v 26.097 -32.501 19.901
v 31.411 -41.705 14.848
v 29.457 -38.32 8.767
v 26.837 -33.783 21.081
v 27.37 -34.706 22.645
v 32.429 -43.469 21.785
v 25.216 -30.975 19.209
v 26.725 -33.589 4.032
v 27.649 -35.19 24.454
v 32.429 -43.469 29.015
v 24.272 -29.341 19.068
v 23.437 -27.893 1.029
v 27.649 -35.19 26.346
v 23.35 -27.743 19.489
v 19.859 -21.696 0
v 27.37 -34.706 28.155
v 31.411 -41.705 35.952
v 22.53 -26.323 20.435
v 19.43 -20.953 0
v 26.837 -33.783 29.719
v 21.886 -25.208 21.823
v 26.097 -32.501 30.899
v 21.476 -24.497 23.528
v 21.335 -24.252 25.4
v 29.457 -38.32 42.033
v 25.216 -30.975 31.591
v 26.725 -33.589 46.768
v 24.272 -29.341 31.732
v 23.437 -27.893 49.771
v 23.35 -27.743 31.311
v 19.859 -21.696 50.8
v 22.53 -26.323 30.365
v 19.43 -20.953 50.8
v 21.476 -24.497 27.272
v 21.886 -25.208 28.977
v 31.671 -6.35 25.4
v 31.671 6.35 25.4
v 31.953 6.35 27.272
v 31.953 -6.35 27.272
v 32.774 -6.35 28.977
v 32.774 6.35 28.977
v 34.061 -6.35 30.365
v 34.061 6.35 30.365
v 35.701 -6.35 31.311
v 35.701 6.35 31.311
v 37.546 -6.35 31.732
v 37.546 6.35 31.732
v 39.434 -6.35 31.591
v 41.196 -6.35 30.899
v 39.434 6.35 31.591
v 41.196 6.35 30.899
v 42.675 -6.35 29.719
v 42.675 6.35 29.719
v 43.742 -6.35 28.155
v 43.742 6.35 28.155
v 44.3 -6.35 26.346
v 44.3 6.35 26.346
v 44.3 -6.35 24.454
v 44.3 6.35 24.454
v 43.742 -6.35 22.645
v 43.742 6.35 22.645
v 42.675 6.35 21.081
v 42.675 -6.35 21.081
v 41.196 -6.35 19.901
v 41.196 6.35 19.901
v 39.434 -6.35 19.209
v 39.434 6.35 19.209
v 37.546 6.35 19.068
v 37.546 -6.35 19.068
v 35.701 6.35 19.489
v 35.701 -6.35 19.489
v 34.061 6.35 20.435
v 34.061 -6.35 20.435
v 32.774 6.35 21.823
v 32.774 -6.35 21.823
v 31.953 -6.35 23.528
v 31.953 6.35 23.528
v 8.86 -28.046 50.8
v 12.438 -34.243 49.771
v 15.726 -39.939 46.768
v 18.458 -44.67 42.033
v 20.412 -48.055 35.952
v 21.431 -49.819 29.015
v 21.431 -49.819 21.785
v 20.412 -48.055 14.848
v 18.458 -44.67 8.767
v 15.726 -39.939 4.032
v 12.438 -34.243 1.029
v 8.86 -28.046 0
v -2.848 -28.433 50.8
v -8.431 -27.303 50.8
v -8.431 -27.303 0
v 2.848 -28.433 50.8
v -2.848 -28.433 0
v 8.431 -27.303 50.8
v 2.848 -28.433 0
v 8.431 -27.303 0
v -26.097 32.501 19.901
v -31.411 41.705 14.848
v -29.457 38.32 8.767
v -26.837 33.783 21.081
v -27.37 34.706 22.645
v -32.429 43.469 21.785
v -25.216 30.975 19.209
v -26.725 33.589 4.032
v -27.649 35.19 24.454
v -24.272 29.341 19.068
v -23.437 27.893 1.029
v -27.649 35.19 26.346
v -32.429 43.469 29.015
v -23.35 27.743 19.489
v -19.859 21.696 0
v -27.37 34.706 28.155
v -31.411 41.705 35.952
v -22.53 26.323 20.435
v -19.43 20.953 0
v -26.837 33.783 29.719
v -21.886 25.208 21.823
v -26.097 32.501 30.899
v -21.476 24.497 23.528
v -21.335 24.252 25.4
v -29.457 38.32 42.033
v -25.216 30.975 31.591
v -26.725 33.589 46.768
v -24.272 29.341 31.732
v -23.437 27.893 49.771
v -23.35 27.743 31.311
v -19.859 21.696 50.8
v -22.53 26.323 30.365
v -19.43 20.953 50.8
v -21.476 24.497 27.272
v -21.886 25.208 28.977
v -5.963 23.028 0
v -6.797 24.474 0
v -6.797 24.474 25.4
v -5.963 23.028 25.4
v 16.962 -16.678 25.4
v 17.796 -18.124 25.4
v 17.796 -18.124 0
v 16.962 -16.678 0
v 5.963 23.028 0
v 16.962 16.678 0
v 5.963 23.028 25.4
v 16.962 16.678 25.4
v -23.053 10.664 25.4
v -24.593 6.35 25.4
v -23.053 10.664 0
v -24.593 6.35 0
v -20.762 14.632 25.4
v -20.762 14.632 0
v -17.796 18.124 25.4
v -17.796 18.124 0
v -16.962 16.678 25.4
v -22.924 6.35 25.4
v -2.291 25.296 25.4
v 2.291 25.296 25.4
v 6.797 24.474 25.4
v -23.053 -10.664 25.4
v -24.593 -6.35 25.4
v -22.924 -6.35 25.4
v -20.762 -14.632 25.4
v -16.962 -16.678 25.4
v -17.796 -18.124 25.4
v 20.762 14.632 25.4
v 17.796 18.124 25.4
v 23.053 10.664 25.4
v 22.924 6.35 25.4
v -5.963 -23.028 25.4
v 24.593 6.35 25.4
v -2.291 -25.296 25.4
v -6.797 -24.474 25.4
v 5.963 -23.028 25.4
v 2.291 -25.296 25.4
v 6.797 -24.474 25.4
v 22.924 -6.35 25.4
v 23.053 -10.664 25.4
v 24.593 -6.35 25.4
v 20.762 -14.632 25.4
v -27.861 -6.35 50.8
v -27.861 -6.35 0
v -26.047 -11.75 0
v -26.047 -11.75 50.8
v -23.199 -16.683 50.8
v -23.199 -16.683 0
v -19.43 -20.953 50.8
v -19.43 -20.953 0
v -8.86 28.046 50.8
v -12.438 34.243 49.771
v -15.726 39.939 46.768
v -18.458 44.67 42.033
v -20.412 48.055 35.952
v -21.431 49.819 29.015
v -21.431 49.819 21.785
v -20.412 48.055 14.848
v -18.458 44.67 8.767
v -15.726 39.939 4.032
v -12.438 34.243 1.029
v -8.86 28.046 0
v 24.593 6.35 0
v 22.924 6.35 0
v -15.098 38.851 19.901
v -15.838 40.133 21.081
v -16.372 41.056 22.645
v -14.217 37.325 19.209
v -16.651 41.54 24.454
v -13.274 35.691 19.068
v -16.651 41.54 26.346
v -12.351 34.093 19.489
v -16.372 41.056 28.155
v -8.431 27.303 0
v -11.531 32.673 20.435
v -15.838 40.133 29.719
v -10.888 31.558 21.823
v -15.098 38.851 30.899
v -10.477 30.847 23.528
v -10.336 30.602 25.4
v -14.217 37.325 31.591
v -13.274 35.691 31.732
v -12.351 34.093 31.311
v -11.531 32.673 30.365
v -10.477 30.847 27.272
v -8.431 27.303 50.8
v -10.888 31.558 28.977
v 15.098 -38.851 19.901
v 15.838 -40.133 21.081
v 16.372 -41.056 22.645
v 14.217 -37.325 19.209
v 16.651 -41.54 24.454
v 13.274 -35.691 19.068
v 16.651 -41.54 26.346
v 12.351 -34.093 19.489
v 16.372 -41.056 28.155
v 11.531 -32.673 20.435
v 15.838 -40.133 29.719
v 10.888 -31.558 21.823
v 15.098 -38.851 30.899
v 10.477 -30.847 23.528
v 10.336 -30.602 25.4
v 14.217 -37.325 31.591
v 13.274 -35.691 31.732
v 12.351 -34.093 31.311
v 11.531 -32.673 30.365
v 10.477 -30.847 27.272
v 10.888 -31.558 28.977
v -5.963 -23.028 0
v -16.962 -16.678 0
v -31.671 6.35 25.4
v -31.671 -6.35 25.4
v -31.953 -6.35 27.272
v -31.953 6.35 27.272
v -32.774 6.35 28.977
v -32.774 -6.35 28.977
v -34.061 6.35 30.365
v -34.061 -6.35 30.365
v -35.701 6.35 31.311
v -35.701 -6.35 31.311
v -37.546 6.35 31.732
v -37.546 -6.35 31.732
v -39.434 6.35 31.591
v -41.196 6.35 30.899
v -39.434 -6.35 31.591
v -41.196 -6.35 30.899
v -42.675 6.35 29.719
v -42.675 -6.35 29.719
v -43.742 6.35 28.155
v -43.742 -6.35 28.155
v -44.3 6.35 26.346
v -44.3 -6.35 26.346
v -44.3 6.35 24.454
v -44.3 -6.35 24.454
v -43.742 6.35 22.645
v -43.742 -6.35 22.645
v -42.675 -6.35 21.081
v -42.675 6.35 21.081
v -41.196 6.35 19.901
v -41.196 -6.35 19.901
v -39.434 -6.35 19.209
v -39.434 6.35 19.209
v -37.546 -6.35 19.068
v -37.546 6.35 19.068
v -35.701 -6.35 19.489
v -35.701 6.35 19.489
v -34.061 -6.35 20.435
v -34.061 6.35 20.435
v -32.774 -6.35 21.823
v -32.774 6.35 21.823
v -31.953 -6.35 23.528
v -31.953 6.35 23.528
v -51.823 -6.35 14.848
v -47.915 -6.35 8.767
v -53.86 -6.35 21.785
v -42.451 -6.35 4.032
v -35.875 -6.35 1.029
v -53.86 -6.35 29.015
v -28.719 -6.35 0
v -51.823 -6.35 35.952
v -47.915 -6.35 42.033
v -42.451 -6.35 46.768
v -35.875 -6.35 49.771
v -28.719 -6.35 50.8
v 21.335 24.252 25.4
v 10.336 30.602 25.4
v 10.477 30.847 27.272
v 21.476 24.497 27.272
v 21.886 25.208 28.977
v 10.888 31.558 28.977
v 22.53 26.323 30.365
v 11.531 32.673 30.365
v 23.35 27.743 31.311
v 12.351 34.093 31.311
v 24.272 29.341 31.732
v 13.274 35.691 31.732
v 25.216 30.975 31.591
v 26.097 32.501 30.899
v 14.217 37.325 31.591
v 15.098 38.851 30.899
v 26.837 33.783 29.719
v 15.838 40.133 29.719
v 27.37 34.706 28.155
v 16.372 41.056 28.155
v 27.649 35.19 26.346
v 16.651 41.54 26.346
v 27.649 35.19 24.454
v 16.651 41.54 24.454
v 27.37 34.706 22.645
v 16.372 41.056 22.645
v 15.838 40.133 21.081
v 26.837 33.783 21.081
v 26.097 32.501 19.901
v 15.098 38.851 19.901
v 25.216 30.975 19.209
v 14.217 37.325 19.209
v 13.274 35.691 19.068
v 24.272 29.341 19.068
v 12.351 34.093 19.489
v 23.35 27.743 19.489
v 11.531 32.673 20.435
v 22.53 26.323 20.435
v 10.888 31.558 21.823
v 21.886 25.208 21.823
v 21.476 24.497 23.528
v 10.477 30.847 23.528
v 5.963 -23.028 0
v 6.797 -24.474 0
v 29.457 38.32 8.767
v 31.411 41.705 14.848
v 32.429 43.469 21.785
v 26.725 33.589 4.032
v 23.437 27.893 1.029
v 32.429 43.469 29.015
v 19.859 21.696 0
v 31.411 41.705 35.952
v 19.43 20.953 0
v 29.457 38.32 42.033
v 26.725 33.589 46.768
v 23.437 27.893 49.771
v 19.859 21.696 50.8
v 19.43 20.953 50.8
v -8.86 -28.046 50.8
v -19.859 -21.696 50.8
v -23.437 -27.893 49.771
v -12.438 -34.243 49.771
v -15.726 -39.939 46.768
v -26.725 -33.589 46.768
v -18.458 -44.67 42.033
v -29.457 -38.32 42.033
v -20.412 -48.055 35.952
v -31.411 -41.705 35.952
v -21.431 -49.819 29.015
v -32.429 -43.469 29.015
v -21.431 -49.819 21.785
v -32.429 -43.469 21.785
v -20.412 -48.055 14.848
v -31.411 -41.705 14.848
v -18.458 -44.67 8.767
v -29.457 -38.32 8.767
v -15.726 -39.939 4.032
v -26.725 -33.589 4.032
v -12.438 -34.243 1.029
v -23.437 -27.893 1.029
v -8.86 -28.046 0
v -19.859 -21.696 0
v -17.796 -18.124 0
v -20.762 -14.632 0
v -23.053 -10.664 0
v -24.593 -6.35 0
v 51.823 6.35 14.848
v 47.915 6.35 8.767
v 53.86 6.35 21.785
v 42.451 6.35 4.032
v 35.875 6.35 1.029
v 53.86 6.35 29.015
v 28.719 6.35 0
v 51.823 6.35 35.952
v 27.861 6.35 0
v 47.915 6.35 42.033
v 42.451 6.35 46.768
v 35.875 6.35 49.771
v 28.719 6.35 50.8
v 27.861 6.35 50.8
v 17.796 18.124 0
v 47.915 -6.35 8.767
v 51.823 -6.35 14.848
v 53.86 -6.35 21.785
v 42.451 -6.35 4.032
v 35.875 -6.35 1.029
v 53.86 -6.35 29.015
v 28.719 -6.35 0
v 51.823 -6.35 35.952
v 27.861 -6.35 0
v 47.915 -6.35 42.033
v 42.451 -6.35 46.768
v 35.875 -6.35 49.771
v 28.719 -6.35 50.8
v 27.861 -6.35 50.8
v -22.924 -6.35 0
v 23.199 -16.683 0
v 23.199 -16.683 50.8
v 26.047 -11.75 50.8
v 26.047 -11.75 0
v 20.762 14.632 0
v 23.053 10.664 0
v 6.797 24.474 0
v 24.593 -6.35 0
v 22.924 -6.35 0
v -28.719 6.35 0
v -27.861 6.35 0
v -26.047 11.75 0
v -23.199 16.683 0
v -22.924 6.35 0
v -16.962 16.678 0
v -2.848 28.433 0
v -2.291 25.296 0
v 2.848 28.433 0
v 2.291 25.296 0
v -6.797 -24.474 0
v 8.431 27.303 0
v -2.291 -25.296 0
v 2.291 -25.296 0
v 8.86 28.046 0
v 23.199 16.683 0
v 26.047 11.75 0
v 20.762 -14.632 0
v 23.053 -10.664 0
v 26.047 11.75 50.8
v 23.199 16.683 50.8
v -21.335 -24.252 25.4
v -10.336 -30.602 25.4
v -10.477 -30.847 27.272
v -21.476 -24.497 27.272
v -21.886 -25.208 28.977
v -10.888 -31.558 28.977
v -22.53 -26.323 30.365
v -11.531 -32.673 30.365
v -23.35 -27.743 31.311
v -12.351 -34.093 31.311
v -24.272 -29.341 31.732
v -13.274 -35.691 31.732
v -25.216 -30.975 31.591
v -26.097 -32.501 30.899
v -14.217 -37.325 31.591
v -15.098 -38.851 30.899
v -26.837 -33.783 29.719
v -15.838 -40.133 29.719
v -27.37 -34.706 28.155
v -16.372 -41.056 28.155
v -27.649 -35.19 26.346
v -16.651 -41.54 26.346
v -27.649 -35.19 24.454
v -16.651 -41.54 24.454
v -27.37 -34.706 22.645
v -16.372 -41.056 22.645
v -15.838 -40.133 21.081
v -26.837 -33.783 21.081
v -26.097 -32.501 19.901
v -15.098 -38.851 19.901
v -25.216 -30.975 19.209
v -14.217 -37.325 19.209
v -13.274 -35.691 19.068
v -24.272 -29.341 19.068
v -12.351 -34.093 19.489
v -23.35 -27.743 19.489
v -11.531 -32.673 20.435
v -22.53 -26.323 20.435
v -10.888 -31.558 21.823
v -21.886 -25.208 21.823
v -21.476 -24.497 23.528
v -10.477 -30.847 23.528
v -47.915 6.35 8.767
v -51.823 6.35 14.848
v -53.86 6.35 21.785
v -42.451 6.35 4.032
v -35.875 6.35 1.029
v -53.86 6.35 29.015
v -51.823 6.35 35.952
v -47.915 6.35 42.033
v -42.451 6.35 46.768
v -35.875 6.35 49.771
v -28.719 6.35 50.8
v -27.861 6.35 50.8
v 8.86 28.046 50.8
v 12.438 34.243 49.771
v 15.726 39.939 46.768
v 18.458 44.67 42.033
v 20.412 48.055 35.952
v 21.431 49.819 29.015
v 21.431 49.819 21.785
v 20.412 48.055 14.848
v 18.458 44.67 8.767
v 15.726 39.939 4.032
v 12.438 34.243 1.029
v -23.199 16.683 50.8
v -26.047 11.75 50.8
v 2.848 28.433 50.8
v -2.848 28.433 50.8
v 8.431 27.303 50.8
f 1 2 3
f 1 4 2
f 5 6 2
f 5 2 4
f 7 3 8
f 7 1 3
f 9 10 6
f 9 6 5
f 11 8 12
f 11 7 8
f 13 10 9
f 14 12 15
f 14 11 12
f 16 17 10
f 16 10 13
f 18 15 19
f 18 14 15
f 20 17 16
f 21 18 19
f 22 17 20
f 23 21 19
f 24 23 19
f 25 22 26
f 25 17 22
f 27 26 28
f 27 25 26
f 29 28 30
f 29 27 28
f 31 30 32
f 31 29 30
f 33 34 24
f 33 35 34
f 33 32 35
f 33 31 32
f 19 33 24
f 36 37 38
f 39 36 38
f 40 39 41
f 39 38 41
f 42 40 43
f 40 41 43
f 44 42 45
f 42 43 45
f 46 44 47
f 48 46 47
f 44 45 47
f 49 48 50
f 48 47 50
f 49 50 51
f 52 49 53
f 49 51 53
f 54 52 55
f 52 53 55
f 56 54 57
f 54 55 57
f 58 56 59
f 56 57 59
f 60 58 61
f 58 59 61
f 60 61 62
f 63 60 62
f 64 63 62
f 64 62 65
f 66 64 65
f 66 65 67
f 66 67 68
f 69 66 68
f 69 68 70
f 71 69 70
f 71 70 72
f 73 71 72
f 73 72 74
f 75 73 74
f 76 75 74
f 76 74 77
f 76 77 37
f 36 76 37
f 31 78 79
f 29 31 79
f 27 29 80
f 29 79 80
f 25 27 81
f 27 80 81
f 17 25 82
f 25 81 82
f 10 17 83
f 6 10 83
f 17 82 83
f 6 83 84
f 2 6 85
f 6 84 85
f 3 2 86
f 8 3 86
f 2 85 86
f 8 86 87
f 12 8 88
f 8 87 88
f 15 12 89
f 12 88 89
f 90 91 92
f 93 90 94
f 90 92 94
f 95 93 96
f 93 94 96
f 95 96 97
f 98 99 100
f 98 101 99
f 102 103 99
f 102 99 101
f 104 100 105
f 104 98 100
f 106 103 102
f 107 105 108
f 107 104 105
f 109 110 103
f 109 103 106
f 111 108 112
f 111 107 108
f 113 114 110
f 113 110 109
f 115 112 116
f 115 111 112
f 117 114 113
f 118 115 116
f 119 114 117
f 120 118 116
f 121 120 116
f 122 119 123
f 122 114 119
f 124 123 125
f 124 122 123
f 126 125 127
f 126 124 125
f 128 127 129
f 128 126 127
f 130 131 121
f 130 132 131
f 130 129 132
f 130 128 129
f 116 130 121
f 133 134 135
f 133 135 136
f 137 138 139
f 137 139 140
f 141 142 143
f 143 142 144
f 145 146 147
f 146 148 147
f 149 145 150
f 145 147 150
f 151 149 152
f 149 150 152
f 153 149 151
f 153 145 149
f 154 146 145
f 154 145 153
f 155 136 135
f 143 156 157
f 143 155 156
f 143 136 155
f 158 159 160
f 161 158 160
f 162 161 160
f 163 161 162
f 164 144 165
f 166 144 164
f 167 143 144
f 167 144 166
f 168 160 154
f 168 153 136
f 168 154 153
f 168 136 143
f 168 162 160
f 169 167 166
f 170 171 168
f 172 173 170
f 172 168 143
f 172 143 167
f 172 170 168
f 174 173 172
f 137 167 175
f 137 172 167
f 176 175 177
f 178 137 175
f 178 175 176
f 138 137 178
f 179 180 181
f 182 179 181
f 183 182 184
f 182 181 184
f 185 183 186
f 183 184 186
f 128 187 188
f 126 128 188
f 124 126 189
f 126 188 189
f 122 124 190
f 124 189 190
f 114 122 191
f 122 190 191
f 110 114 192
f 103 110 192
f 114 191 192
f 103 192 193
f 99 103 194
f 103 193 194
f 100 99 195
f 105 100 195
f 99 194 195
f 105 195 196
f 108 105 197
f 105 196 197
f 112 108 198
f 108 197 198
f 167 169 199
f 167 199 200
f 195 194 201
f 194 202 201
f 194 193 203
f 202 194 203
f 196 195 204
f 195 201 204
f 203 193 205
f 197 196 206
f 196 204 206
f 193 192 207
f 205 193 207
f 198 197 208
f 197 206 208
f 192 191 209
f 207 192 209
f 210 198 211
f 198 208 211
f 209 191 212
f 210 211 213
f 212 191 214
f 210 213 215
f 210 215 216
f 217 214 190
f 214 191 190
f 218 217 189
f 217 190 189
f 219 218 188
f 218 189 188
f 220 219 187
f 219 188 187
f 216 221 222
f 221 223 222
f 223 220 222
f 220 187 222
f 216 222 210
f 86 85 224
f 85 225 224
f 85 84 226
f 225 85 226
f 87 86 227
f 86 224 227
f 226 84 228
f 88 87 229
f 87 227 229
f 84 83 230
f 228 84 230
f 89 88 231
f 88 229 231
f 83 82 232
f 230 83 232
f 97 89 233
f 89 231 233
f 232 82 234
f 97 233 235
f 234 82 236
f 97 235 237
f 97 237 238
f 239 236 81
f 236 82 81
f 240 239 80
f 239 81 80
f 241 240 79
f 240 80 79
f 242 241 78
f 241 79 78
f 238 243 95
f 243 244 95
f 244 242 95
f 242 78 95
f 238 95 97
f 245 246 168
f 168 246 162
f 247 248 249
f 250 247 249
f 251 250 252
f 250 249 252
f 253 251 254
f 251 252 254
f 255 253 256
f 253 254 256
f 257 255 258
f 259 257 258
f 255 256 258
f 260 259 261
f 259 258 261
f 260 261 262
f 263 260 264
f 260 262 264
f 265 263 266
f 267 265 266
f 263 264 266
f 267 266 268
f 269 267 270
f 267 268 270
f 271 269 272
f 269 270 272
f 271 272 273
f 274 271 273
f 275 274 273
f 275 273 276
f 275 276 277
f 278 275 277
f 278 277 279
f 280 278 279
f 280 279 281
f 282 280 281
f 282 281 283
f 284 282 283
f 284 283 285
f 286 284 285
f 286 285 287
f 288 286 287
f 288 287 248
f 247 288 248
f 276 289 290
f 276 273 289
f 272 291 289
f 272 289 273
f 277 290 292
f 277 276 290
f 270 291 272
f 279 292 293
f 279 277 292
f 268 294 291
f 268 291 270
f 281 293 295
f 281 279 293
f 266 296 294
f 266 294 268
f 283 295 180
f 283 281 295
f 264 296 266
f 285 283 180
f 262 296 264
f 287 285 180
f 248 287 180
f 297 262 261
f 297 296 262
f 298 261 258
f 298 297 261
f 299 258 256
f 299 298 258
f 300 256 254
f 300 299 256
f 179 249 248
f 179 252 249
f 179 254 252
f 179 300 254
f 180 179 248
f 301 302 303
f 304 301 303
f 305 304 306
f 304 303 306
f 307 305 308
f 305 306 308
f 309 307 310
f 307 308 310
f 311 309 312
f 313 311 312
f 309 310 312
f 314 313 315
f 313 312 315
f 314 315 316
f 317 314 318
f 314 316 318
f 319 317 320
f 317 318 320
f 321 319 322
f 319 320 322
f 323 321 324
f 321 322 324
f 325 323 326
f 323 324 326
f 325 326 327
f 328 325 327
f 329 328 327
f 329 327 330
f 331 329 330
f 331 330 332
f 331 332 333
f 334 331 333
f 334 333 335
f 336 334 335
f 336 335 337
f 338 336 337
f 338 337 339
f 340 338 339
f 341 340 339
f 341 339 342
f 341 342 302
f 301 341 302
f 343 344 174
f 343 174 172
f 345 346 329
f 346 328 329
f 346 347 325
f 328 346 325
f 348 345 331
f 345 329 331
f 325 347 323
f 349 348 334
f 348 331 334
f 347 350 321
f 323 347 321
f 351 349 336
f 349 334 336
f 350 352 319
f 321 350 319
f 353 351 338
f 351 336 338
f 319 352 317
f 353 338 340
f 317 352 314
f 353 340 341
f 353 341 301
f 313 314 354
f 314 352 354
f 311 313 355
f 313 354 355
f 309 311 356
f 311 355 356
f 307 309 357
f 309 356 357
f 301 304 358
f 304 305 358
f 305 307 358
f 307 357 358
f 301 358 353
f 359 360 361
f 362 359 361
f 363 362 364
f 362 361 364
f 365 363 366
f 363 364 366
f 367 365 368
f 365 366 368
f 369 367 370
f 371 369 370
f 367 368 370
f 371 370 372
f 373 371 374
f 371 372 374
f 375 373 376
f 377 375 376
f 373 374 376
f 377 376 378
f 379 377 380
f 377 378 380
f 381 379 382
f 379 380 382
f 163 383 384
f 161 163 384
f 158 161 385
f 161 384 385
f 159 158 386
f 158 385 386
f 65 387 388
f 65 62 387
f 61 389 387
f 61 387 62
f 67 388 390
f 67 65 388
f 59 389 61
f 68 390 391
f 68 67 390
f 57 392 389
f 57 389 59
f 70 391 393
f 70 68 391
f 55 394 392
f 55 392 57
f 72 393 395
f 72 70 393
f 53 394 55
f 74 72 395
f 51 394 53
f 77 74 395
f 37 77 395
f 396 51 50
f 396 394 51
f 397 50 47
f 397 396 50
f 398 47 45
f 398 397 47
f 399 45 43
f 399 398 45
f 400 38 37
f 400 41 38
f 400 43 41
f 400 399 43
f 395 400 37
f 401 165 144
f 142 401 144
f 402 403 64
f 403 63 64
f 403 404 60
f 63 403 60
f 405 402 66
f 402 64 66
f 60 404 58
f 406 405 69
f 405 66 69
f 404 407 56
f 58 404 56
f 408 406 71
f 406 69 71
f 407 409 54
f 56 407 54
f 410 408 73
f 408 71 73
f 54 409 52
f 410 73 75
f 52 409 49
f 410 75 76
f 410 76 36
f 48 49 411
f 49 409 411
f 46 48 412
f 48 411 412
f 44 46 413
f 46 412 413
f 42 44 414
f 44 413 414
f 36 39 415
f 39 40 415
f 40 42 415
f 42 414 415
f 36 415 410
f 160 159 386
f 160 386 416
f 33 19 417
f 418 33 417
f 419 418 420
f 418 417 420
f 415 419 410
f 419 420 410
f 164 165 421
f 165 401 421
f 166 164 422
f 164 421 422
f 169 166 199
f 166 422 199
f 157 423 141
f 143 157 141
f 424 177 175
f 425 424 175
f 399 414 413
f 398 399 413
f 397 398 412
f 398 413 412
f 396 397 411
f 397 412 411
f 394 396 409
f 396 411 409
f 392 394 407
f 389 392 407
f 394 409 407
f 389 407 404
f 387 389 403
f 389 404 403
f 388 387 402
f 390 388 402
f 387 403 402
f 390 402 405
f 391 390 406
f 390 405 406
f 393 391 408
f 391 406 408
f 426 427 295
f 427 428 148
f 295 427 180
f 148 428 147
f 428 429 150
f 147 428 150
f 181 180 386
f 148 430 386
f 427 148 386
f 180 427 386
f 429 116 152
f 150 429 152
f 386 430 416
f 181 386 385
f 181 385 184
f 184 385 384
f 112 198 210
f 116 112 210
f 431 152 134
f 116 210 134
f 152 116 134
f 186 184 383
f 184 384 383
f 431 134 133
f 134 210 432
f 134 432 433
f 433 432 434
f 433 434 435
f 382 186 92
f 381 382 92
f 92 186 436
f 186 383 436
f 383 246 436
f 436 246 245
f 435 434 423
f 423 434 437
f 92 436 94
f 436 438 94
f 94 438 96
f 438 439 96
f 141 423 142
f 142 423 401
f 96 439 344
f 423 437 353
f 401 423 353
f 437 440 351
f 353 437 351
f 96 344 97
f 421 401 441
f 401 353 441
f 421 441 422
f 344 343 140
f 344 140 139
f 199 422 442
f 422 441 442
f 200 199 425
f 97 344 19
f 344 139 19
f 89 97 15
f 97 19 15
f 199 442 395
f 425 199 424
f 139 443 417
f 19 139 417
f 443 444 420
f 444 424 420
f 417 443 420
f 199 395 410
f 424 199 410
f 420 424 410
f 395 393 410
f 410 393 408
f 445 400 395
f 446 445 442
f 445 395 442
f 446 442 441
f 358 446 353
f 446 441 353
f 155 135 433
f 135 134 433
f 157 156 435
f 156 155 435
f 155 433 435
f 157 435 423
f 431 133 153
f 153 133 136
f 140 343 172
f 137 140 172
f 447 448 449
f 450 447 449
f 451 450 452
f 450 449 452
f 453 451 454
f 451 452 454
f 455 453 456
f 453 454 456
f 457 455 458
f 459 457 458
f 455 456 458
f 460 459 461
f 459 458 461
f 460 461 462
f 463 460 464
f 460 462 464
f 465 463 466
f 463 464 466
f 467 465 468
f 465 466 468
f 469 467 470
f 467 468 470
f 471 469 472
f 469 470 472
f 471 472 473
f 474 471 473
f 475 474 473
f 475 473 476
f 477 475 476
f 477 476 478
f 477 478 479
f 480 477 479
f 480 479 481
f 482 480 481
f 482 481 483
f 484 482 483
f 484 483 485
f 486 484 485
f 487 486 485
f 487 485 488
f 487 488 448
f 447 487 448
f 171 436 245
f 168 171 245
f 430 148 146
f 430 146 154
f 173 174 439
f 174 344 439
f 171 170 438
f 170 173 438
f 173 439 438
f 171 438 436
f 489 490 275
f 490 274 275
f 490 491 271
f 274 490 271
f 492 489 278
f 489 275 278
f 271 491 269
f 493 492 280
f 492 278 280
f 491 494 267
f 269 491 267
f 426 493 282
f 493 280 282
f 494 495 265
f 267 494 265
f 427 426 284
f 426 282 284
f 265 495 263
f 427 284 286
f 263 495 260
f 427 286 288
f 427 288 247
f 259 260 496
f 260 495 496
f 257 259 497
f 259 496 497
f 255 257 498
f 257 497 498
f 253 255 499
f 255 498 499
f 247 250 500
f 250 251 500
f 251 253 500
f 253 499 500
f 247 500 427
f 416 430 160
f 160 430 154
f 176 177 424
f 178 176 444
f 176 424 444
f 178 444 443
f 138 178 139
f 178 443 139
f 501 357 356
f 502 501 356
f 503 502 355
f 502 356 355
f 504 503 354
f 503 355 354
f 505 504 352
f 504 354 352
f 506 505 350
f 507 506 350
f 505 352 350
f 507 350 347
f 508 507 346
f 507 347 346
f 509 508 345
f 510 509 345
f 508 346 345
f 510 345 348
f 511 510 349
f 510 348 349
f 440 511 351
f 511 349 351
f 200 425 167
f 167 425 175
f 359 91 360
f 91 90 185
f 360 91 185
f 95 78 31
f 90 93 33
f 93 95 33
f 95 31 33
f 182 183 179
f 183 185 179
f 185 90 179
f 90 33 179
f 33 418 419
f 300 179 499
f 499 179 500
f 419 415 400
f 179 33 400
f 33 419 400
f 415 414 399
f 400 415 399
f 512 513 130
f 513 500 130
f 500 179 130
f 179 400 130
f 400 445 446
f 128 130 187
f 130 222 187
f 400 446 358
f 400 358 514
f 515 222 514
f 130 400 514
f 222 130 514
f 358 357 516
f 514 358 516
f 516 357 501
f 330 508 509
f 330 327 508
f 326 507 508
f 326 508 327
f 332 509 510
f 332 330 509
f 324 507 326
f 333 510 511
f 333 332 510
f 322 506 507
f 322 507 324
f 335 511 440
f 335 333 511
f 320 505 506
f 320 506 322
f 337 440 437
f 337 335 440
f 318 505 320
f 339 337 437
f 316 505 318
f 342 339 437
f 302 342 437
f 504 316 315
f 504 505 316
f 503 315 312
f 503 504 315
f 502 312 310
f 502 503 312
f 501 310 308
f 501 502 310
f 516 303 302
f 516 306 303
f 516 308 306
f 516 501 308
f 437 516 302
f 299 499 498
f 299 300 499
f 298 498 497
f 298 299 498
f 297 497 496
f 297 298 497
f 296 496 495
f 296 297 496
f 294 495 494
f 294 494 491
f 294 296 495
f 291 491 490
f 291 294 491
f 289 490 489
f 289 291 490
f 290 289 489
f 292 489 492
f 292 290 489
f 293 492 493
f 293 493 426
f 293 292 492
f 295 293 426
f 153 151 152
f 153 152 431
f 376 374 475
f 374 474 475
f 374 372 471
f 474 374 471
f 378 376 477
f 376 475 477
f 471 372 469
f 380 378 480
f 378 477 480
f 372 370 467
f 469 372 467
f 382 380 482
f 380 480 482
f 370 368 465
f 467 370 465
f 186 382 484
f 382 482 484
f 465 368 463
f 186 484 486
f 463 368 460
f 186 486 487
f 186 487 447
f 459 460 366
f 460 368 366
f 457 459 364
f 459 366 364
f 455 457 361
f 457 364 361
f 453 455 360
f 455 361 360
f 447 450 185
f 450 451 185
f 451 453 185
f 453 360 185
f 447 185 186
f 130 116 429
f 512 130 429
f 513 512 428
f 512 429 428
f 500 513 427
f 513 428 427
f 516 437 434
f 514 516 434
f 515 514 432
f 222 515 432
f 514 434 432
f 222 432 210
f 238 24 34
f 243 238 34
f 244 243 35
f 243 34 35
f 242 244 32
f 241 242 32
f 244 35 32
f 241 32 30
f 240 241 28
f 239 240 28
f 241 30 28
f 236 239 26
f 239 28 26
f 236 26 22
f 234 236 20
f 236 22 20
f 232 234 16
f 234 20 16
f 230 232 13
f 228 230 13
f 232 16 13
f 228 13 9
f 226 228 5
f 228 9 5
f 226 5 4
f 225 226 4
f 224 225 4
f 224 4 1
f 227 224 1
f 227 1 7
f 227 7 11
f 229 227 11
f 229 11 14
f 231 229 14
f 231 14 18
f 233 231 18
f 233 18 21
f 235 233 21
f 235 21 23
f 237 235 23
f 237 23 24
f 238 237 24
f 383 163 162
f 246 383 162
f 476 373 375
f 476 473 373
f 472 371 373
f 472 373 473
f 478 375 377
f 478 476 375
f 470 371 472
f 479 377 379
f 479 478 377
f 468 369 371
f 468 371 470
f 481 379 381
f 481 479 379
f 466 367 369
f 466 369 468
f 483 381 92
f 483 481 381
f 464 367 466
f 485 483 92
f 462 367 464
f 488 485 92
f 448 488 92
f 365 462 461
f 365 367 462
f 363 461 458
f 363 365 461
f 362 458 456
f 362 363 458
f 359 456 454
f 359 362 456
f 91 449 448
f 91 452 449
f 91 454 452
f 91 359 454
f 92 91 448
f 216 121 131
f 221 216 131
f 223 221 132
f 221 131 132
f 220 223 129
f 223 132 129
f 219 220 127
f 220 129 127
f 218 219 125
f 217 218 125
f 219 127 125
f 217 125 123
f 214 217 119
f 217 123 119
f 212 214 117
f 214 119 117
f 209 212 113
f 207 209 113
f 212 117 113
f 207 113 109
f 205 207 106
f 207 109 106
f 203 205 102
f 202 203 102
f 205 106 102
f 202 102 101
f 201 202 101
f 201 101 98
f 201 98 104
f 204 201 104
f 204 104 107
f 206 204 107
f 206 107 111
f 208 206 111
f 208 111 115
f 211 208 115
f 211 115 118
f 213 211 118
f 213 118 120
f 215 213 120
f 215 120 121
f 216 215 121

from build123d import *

# Parameters (mm, degrees)
F0_R            = 28.575
F1_DEPTH        = 50.8
F2_R            = 25.4
F3_DEPTH        = 25.4
F5_DEPTH        = 6.35
F5_DEPTH_BACK   = 6.35
F5_COPIES_COUNT = 6
F6_R            = 6.35
F7_DEPTH        = 25.4
F7_COPIES_COUNT = 6


# Not quite as in the source:
# - a pattern or mirror of a feature is missing from the dataset's text; its kind, count and spacing are read off the source's solid


with BuildPart() as f1:
    # F0 (on Top) → F1 (new body)
    with BuildSketch(Plane.XY):
        Circle(F0_R)
    extrude(amount=F1_DEPTH)

    # F2 (on face) → F3 (cut)
    with BuildSketch(Plane(origin=(0, 0, 0), x_dir=(1, 0, 0), z_dir=(0, 0, -1))):
        Circle(F2_R)
    extrude(amount=-F3_DEPTH, mode=Mode.SUBTRACT)

    # F4 (on Front) → F5 (join, two sides)
    with BuildSketch(Plane.XZ) as f5_sk:
        with BuildLine():
            ThreePointArc((-28.718591857, 50.8), (-54.118591857, 25.4), (-28.718591857, 0))
            Line((-28.718591857, 0), (-22.9244896994, 0))
            Line((-22.9244896994, 0), (-22.9244896994, 50.8))
            Line((-22.9244896994, 50.8), (-28.718591857, 50.8))
        make_face()
    f5 = extrude(amount=F5_DEPTH) + extrude(f5_sk.sketch, amount=-F5_DEPTH_BACK)

    # F5_copies: F5 ×6 about axis
    f5_copies_axis = Axis((0, 0, 0), (0, 0, 1))
    for i in range(1, F5_COPIES_COUNT):
        add(f5.rotate(f5_copies_axis, i * 360 / F5_COPIES_COUNT))

    # F6 (on face) → F7 (cut)
    with BuildSketch(Plane.XZ.offset(6.35)):
        with Locations((-38.02051193, 25.4)):
            Circle(F6_R)
    f7 = extrude(amount=-F7_DEPTH, mode=Mode.SUBTRACT)

    # F7_copies: F7 ×6 about axis
    f7_copies_axis = Axis((0, 0, 0), (0, 0, 1))
    for i in range(1, F7_COPIES_COUNT):
        add(f7.rotate(f7_copies_axis, i * 360 / F7_COPIES_COUNT), mode=Mode.SUBTRACT)


solid = f1.part
